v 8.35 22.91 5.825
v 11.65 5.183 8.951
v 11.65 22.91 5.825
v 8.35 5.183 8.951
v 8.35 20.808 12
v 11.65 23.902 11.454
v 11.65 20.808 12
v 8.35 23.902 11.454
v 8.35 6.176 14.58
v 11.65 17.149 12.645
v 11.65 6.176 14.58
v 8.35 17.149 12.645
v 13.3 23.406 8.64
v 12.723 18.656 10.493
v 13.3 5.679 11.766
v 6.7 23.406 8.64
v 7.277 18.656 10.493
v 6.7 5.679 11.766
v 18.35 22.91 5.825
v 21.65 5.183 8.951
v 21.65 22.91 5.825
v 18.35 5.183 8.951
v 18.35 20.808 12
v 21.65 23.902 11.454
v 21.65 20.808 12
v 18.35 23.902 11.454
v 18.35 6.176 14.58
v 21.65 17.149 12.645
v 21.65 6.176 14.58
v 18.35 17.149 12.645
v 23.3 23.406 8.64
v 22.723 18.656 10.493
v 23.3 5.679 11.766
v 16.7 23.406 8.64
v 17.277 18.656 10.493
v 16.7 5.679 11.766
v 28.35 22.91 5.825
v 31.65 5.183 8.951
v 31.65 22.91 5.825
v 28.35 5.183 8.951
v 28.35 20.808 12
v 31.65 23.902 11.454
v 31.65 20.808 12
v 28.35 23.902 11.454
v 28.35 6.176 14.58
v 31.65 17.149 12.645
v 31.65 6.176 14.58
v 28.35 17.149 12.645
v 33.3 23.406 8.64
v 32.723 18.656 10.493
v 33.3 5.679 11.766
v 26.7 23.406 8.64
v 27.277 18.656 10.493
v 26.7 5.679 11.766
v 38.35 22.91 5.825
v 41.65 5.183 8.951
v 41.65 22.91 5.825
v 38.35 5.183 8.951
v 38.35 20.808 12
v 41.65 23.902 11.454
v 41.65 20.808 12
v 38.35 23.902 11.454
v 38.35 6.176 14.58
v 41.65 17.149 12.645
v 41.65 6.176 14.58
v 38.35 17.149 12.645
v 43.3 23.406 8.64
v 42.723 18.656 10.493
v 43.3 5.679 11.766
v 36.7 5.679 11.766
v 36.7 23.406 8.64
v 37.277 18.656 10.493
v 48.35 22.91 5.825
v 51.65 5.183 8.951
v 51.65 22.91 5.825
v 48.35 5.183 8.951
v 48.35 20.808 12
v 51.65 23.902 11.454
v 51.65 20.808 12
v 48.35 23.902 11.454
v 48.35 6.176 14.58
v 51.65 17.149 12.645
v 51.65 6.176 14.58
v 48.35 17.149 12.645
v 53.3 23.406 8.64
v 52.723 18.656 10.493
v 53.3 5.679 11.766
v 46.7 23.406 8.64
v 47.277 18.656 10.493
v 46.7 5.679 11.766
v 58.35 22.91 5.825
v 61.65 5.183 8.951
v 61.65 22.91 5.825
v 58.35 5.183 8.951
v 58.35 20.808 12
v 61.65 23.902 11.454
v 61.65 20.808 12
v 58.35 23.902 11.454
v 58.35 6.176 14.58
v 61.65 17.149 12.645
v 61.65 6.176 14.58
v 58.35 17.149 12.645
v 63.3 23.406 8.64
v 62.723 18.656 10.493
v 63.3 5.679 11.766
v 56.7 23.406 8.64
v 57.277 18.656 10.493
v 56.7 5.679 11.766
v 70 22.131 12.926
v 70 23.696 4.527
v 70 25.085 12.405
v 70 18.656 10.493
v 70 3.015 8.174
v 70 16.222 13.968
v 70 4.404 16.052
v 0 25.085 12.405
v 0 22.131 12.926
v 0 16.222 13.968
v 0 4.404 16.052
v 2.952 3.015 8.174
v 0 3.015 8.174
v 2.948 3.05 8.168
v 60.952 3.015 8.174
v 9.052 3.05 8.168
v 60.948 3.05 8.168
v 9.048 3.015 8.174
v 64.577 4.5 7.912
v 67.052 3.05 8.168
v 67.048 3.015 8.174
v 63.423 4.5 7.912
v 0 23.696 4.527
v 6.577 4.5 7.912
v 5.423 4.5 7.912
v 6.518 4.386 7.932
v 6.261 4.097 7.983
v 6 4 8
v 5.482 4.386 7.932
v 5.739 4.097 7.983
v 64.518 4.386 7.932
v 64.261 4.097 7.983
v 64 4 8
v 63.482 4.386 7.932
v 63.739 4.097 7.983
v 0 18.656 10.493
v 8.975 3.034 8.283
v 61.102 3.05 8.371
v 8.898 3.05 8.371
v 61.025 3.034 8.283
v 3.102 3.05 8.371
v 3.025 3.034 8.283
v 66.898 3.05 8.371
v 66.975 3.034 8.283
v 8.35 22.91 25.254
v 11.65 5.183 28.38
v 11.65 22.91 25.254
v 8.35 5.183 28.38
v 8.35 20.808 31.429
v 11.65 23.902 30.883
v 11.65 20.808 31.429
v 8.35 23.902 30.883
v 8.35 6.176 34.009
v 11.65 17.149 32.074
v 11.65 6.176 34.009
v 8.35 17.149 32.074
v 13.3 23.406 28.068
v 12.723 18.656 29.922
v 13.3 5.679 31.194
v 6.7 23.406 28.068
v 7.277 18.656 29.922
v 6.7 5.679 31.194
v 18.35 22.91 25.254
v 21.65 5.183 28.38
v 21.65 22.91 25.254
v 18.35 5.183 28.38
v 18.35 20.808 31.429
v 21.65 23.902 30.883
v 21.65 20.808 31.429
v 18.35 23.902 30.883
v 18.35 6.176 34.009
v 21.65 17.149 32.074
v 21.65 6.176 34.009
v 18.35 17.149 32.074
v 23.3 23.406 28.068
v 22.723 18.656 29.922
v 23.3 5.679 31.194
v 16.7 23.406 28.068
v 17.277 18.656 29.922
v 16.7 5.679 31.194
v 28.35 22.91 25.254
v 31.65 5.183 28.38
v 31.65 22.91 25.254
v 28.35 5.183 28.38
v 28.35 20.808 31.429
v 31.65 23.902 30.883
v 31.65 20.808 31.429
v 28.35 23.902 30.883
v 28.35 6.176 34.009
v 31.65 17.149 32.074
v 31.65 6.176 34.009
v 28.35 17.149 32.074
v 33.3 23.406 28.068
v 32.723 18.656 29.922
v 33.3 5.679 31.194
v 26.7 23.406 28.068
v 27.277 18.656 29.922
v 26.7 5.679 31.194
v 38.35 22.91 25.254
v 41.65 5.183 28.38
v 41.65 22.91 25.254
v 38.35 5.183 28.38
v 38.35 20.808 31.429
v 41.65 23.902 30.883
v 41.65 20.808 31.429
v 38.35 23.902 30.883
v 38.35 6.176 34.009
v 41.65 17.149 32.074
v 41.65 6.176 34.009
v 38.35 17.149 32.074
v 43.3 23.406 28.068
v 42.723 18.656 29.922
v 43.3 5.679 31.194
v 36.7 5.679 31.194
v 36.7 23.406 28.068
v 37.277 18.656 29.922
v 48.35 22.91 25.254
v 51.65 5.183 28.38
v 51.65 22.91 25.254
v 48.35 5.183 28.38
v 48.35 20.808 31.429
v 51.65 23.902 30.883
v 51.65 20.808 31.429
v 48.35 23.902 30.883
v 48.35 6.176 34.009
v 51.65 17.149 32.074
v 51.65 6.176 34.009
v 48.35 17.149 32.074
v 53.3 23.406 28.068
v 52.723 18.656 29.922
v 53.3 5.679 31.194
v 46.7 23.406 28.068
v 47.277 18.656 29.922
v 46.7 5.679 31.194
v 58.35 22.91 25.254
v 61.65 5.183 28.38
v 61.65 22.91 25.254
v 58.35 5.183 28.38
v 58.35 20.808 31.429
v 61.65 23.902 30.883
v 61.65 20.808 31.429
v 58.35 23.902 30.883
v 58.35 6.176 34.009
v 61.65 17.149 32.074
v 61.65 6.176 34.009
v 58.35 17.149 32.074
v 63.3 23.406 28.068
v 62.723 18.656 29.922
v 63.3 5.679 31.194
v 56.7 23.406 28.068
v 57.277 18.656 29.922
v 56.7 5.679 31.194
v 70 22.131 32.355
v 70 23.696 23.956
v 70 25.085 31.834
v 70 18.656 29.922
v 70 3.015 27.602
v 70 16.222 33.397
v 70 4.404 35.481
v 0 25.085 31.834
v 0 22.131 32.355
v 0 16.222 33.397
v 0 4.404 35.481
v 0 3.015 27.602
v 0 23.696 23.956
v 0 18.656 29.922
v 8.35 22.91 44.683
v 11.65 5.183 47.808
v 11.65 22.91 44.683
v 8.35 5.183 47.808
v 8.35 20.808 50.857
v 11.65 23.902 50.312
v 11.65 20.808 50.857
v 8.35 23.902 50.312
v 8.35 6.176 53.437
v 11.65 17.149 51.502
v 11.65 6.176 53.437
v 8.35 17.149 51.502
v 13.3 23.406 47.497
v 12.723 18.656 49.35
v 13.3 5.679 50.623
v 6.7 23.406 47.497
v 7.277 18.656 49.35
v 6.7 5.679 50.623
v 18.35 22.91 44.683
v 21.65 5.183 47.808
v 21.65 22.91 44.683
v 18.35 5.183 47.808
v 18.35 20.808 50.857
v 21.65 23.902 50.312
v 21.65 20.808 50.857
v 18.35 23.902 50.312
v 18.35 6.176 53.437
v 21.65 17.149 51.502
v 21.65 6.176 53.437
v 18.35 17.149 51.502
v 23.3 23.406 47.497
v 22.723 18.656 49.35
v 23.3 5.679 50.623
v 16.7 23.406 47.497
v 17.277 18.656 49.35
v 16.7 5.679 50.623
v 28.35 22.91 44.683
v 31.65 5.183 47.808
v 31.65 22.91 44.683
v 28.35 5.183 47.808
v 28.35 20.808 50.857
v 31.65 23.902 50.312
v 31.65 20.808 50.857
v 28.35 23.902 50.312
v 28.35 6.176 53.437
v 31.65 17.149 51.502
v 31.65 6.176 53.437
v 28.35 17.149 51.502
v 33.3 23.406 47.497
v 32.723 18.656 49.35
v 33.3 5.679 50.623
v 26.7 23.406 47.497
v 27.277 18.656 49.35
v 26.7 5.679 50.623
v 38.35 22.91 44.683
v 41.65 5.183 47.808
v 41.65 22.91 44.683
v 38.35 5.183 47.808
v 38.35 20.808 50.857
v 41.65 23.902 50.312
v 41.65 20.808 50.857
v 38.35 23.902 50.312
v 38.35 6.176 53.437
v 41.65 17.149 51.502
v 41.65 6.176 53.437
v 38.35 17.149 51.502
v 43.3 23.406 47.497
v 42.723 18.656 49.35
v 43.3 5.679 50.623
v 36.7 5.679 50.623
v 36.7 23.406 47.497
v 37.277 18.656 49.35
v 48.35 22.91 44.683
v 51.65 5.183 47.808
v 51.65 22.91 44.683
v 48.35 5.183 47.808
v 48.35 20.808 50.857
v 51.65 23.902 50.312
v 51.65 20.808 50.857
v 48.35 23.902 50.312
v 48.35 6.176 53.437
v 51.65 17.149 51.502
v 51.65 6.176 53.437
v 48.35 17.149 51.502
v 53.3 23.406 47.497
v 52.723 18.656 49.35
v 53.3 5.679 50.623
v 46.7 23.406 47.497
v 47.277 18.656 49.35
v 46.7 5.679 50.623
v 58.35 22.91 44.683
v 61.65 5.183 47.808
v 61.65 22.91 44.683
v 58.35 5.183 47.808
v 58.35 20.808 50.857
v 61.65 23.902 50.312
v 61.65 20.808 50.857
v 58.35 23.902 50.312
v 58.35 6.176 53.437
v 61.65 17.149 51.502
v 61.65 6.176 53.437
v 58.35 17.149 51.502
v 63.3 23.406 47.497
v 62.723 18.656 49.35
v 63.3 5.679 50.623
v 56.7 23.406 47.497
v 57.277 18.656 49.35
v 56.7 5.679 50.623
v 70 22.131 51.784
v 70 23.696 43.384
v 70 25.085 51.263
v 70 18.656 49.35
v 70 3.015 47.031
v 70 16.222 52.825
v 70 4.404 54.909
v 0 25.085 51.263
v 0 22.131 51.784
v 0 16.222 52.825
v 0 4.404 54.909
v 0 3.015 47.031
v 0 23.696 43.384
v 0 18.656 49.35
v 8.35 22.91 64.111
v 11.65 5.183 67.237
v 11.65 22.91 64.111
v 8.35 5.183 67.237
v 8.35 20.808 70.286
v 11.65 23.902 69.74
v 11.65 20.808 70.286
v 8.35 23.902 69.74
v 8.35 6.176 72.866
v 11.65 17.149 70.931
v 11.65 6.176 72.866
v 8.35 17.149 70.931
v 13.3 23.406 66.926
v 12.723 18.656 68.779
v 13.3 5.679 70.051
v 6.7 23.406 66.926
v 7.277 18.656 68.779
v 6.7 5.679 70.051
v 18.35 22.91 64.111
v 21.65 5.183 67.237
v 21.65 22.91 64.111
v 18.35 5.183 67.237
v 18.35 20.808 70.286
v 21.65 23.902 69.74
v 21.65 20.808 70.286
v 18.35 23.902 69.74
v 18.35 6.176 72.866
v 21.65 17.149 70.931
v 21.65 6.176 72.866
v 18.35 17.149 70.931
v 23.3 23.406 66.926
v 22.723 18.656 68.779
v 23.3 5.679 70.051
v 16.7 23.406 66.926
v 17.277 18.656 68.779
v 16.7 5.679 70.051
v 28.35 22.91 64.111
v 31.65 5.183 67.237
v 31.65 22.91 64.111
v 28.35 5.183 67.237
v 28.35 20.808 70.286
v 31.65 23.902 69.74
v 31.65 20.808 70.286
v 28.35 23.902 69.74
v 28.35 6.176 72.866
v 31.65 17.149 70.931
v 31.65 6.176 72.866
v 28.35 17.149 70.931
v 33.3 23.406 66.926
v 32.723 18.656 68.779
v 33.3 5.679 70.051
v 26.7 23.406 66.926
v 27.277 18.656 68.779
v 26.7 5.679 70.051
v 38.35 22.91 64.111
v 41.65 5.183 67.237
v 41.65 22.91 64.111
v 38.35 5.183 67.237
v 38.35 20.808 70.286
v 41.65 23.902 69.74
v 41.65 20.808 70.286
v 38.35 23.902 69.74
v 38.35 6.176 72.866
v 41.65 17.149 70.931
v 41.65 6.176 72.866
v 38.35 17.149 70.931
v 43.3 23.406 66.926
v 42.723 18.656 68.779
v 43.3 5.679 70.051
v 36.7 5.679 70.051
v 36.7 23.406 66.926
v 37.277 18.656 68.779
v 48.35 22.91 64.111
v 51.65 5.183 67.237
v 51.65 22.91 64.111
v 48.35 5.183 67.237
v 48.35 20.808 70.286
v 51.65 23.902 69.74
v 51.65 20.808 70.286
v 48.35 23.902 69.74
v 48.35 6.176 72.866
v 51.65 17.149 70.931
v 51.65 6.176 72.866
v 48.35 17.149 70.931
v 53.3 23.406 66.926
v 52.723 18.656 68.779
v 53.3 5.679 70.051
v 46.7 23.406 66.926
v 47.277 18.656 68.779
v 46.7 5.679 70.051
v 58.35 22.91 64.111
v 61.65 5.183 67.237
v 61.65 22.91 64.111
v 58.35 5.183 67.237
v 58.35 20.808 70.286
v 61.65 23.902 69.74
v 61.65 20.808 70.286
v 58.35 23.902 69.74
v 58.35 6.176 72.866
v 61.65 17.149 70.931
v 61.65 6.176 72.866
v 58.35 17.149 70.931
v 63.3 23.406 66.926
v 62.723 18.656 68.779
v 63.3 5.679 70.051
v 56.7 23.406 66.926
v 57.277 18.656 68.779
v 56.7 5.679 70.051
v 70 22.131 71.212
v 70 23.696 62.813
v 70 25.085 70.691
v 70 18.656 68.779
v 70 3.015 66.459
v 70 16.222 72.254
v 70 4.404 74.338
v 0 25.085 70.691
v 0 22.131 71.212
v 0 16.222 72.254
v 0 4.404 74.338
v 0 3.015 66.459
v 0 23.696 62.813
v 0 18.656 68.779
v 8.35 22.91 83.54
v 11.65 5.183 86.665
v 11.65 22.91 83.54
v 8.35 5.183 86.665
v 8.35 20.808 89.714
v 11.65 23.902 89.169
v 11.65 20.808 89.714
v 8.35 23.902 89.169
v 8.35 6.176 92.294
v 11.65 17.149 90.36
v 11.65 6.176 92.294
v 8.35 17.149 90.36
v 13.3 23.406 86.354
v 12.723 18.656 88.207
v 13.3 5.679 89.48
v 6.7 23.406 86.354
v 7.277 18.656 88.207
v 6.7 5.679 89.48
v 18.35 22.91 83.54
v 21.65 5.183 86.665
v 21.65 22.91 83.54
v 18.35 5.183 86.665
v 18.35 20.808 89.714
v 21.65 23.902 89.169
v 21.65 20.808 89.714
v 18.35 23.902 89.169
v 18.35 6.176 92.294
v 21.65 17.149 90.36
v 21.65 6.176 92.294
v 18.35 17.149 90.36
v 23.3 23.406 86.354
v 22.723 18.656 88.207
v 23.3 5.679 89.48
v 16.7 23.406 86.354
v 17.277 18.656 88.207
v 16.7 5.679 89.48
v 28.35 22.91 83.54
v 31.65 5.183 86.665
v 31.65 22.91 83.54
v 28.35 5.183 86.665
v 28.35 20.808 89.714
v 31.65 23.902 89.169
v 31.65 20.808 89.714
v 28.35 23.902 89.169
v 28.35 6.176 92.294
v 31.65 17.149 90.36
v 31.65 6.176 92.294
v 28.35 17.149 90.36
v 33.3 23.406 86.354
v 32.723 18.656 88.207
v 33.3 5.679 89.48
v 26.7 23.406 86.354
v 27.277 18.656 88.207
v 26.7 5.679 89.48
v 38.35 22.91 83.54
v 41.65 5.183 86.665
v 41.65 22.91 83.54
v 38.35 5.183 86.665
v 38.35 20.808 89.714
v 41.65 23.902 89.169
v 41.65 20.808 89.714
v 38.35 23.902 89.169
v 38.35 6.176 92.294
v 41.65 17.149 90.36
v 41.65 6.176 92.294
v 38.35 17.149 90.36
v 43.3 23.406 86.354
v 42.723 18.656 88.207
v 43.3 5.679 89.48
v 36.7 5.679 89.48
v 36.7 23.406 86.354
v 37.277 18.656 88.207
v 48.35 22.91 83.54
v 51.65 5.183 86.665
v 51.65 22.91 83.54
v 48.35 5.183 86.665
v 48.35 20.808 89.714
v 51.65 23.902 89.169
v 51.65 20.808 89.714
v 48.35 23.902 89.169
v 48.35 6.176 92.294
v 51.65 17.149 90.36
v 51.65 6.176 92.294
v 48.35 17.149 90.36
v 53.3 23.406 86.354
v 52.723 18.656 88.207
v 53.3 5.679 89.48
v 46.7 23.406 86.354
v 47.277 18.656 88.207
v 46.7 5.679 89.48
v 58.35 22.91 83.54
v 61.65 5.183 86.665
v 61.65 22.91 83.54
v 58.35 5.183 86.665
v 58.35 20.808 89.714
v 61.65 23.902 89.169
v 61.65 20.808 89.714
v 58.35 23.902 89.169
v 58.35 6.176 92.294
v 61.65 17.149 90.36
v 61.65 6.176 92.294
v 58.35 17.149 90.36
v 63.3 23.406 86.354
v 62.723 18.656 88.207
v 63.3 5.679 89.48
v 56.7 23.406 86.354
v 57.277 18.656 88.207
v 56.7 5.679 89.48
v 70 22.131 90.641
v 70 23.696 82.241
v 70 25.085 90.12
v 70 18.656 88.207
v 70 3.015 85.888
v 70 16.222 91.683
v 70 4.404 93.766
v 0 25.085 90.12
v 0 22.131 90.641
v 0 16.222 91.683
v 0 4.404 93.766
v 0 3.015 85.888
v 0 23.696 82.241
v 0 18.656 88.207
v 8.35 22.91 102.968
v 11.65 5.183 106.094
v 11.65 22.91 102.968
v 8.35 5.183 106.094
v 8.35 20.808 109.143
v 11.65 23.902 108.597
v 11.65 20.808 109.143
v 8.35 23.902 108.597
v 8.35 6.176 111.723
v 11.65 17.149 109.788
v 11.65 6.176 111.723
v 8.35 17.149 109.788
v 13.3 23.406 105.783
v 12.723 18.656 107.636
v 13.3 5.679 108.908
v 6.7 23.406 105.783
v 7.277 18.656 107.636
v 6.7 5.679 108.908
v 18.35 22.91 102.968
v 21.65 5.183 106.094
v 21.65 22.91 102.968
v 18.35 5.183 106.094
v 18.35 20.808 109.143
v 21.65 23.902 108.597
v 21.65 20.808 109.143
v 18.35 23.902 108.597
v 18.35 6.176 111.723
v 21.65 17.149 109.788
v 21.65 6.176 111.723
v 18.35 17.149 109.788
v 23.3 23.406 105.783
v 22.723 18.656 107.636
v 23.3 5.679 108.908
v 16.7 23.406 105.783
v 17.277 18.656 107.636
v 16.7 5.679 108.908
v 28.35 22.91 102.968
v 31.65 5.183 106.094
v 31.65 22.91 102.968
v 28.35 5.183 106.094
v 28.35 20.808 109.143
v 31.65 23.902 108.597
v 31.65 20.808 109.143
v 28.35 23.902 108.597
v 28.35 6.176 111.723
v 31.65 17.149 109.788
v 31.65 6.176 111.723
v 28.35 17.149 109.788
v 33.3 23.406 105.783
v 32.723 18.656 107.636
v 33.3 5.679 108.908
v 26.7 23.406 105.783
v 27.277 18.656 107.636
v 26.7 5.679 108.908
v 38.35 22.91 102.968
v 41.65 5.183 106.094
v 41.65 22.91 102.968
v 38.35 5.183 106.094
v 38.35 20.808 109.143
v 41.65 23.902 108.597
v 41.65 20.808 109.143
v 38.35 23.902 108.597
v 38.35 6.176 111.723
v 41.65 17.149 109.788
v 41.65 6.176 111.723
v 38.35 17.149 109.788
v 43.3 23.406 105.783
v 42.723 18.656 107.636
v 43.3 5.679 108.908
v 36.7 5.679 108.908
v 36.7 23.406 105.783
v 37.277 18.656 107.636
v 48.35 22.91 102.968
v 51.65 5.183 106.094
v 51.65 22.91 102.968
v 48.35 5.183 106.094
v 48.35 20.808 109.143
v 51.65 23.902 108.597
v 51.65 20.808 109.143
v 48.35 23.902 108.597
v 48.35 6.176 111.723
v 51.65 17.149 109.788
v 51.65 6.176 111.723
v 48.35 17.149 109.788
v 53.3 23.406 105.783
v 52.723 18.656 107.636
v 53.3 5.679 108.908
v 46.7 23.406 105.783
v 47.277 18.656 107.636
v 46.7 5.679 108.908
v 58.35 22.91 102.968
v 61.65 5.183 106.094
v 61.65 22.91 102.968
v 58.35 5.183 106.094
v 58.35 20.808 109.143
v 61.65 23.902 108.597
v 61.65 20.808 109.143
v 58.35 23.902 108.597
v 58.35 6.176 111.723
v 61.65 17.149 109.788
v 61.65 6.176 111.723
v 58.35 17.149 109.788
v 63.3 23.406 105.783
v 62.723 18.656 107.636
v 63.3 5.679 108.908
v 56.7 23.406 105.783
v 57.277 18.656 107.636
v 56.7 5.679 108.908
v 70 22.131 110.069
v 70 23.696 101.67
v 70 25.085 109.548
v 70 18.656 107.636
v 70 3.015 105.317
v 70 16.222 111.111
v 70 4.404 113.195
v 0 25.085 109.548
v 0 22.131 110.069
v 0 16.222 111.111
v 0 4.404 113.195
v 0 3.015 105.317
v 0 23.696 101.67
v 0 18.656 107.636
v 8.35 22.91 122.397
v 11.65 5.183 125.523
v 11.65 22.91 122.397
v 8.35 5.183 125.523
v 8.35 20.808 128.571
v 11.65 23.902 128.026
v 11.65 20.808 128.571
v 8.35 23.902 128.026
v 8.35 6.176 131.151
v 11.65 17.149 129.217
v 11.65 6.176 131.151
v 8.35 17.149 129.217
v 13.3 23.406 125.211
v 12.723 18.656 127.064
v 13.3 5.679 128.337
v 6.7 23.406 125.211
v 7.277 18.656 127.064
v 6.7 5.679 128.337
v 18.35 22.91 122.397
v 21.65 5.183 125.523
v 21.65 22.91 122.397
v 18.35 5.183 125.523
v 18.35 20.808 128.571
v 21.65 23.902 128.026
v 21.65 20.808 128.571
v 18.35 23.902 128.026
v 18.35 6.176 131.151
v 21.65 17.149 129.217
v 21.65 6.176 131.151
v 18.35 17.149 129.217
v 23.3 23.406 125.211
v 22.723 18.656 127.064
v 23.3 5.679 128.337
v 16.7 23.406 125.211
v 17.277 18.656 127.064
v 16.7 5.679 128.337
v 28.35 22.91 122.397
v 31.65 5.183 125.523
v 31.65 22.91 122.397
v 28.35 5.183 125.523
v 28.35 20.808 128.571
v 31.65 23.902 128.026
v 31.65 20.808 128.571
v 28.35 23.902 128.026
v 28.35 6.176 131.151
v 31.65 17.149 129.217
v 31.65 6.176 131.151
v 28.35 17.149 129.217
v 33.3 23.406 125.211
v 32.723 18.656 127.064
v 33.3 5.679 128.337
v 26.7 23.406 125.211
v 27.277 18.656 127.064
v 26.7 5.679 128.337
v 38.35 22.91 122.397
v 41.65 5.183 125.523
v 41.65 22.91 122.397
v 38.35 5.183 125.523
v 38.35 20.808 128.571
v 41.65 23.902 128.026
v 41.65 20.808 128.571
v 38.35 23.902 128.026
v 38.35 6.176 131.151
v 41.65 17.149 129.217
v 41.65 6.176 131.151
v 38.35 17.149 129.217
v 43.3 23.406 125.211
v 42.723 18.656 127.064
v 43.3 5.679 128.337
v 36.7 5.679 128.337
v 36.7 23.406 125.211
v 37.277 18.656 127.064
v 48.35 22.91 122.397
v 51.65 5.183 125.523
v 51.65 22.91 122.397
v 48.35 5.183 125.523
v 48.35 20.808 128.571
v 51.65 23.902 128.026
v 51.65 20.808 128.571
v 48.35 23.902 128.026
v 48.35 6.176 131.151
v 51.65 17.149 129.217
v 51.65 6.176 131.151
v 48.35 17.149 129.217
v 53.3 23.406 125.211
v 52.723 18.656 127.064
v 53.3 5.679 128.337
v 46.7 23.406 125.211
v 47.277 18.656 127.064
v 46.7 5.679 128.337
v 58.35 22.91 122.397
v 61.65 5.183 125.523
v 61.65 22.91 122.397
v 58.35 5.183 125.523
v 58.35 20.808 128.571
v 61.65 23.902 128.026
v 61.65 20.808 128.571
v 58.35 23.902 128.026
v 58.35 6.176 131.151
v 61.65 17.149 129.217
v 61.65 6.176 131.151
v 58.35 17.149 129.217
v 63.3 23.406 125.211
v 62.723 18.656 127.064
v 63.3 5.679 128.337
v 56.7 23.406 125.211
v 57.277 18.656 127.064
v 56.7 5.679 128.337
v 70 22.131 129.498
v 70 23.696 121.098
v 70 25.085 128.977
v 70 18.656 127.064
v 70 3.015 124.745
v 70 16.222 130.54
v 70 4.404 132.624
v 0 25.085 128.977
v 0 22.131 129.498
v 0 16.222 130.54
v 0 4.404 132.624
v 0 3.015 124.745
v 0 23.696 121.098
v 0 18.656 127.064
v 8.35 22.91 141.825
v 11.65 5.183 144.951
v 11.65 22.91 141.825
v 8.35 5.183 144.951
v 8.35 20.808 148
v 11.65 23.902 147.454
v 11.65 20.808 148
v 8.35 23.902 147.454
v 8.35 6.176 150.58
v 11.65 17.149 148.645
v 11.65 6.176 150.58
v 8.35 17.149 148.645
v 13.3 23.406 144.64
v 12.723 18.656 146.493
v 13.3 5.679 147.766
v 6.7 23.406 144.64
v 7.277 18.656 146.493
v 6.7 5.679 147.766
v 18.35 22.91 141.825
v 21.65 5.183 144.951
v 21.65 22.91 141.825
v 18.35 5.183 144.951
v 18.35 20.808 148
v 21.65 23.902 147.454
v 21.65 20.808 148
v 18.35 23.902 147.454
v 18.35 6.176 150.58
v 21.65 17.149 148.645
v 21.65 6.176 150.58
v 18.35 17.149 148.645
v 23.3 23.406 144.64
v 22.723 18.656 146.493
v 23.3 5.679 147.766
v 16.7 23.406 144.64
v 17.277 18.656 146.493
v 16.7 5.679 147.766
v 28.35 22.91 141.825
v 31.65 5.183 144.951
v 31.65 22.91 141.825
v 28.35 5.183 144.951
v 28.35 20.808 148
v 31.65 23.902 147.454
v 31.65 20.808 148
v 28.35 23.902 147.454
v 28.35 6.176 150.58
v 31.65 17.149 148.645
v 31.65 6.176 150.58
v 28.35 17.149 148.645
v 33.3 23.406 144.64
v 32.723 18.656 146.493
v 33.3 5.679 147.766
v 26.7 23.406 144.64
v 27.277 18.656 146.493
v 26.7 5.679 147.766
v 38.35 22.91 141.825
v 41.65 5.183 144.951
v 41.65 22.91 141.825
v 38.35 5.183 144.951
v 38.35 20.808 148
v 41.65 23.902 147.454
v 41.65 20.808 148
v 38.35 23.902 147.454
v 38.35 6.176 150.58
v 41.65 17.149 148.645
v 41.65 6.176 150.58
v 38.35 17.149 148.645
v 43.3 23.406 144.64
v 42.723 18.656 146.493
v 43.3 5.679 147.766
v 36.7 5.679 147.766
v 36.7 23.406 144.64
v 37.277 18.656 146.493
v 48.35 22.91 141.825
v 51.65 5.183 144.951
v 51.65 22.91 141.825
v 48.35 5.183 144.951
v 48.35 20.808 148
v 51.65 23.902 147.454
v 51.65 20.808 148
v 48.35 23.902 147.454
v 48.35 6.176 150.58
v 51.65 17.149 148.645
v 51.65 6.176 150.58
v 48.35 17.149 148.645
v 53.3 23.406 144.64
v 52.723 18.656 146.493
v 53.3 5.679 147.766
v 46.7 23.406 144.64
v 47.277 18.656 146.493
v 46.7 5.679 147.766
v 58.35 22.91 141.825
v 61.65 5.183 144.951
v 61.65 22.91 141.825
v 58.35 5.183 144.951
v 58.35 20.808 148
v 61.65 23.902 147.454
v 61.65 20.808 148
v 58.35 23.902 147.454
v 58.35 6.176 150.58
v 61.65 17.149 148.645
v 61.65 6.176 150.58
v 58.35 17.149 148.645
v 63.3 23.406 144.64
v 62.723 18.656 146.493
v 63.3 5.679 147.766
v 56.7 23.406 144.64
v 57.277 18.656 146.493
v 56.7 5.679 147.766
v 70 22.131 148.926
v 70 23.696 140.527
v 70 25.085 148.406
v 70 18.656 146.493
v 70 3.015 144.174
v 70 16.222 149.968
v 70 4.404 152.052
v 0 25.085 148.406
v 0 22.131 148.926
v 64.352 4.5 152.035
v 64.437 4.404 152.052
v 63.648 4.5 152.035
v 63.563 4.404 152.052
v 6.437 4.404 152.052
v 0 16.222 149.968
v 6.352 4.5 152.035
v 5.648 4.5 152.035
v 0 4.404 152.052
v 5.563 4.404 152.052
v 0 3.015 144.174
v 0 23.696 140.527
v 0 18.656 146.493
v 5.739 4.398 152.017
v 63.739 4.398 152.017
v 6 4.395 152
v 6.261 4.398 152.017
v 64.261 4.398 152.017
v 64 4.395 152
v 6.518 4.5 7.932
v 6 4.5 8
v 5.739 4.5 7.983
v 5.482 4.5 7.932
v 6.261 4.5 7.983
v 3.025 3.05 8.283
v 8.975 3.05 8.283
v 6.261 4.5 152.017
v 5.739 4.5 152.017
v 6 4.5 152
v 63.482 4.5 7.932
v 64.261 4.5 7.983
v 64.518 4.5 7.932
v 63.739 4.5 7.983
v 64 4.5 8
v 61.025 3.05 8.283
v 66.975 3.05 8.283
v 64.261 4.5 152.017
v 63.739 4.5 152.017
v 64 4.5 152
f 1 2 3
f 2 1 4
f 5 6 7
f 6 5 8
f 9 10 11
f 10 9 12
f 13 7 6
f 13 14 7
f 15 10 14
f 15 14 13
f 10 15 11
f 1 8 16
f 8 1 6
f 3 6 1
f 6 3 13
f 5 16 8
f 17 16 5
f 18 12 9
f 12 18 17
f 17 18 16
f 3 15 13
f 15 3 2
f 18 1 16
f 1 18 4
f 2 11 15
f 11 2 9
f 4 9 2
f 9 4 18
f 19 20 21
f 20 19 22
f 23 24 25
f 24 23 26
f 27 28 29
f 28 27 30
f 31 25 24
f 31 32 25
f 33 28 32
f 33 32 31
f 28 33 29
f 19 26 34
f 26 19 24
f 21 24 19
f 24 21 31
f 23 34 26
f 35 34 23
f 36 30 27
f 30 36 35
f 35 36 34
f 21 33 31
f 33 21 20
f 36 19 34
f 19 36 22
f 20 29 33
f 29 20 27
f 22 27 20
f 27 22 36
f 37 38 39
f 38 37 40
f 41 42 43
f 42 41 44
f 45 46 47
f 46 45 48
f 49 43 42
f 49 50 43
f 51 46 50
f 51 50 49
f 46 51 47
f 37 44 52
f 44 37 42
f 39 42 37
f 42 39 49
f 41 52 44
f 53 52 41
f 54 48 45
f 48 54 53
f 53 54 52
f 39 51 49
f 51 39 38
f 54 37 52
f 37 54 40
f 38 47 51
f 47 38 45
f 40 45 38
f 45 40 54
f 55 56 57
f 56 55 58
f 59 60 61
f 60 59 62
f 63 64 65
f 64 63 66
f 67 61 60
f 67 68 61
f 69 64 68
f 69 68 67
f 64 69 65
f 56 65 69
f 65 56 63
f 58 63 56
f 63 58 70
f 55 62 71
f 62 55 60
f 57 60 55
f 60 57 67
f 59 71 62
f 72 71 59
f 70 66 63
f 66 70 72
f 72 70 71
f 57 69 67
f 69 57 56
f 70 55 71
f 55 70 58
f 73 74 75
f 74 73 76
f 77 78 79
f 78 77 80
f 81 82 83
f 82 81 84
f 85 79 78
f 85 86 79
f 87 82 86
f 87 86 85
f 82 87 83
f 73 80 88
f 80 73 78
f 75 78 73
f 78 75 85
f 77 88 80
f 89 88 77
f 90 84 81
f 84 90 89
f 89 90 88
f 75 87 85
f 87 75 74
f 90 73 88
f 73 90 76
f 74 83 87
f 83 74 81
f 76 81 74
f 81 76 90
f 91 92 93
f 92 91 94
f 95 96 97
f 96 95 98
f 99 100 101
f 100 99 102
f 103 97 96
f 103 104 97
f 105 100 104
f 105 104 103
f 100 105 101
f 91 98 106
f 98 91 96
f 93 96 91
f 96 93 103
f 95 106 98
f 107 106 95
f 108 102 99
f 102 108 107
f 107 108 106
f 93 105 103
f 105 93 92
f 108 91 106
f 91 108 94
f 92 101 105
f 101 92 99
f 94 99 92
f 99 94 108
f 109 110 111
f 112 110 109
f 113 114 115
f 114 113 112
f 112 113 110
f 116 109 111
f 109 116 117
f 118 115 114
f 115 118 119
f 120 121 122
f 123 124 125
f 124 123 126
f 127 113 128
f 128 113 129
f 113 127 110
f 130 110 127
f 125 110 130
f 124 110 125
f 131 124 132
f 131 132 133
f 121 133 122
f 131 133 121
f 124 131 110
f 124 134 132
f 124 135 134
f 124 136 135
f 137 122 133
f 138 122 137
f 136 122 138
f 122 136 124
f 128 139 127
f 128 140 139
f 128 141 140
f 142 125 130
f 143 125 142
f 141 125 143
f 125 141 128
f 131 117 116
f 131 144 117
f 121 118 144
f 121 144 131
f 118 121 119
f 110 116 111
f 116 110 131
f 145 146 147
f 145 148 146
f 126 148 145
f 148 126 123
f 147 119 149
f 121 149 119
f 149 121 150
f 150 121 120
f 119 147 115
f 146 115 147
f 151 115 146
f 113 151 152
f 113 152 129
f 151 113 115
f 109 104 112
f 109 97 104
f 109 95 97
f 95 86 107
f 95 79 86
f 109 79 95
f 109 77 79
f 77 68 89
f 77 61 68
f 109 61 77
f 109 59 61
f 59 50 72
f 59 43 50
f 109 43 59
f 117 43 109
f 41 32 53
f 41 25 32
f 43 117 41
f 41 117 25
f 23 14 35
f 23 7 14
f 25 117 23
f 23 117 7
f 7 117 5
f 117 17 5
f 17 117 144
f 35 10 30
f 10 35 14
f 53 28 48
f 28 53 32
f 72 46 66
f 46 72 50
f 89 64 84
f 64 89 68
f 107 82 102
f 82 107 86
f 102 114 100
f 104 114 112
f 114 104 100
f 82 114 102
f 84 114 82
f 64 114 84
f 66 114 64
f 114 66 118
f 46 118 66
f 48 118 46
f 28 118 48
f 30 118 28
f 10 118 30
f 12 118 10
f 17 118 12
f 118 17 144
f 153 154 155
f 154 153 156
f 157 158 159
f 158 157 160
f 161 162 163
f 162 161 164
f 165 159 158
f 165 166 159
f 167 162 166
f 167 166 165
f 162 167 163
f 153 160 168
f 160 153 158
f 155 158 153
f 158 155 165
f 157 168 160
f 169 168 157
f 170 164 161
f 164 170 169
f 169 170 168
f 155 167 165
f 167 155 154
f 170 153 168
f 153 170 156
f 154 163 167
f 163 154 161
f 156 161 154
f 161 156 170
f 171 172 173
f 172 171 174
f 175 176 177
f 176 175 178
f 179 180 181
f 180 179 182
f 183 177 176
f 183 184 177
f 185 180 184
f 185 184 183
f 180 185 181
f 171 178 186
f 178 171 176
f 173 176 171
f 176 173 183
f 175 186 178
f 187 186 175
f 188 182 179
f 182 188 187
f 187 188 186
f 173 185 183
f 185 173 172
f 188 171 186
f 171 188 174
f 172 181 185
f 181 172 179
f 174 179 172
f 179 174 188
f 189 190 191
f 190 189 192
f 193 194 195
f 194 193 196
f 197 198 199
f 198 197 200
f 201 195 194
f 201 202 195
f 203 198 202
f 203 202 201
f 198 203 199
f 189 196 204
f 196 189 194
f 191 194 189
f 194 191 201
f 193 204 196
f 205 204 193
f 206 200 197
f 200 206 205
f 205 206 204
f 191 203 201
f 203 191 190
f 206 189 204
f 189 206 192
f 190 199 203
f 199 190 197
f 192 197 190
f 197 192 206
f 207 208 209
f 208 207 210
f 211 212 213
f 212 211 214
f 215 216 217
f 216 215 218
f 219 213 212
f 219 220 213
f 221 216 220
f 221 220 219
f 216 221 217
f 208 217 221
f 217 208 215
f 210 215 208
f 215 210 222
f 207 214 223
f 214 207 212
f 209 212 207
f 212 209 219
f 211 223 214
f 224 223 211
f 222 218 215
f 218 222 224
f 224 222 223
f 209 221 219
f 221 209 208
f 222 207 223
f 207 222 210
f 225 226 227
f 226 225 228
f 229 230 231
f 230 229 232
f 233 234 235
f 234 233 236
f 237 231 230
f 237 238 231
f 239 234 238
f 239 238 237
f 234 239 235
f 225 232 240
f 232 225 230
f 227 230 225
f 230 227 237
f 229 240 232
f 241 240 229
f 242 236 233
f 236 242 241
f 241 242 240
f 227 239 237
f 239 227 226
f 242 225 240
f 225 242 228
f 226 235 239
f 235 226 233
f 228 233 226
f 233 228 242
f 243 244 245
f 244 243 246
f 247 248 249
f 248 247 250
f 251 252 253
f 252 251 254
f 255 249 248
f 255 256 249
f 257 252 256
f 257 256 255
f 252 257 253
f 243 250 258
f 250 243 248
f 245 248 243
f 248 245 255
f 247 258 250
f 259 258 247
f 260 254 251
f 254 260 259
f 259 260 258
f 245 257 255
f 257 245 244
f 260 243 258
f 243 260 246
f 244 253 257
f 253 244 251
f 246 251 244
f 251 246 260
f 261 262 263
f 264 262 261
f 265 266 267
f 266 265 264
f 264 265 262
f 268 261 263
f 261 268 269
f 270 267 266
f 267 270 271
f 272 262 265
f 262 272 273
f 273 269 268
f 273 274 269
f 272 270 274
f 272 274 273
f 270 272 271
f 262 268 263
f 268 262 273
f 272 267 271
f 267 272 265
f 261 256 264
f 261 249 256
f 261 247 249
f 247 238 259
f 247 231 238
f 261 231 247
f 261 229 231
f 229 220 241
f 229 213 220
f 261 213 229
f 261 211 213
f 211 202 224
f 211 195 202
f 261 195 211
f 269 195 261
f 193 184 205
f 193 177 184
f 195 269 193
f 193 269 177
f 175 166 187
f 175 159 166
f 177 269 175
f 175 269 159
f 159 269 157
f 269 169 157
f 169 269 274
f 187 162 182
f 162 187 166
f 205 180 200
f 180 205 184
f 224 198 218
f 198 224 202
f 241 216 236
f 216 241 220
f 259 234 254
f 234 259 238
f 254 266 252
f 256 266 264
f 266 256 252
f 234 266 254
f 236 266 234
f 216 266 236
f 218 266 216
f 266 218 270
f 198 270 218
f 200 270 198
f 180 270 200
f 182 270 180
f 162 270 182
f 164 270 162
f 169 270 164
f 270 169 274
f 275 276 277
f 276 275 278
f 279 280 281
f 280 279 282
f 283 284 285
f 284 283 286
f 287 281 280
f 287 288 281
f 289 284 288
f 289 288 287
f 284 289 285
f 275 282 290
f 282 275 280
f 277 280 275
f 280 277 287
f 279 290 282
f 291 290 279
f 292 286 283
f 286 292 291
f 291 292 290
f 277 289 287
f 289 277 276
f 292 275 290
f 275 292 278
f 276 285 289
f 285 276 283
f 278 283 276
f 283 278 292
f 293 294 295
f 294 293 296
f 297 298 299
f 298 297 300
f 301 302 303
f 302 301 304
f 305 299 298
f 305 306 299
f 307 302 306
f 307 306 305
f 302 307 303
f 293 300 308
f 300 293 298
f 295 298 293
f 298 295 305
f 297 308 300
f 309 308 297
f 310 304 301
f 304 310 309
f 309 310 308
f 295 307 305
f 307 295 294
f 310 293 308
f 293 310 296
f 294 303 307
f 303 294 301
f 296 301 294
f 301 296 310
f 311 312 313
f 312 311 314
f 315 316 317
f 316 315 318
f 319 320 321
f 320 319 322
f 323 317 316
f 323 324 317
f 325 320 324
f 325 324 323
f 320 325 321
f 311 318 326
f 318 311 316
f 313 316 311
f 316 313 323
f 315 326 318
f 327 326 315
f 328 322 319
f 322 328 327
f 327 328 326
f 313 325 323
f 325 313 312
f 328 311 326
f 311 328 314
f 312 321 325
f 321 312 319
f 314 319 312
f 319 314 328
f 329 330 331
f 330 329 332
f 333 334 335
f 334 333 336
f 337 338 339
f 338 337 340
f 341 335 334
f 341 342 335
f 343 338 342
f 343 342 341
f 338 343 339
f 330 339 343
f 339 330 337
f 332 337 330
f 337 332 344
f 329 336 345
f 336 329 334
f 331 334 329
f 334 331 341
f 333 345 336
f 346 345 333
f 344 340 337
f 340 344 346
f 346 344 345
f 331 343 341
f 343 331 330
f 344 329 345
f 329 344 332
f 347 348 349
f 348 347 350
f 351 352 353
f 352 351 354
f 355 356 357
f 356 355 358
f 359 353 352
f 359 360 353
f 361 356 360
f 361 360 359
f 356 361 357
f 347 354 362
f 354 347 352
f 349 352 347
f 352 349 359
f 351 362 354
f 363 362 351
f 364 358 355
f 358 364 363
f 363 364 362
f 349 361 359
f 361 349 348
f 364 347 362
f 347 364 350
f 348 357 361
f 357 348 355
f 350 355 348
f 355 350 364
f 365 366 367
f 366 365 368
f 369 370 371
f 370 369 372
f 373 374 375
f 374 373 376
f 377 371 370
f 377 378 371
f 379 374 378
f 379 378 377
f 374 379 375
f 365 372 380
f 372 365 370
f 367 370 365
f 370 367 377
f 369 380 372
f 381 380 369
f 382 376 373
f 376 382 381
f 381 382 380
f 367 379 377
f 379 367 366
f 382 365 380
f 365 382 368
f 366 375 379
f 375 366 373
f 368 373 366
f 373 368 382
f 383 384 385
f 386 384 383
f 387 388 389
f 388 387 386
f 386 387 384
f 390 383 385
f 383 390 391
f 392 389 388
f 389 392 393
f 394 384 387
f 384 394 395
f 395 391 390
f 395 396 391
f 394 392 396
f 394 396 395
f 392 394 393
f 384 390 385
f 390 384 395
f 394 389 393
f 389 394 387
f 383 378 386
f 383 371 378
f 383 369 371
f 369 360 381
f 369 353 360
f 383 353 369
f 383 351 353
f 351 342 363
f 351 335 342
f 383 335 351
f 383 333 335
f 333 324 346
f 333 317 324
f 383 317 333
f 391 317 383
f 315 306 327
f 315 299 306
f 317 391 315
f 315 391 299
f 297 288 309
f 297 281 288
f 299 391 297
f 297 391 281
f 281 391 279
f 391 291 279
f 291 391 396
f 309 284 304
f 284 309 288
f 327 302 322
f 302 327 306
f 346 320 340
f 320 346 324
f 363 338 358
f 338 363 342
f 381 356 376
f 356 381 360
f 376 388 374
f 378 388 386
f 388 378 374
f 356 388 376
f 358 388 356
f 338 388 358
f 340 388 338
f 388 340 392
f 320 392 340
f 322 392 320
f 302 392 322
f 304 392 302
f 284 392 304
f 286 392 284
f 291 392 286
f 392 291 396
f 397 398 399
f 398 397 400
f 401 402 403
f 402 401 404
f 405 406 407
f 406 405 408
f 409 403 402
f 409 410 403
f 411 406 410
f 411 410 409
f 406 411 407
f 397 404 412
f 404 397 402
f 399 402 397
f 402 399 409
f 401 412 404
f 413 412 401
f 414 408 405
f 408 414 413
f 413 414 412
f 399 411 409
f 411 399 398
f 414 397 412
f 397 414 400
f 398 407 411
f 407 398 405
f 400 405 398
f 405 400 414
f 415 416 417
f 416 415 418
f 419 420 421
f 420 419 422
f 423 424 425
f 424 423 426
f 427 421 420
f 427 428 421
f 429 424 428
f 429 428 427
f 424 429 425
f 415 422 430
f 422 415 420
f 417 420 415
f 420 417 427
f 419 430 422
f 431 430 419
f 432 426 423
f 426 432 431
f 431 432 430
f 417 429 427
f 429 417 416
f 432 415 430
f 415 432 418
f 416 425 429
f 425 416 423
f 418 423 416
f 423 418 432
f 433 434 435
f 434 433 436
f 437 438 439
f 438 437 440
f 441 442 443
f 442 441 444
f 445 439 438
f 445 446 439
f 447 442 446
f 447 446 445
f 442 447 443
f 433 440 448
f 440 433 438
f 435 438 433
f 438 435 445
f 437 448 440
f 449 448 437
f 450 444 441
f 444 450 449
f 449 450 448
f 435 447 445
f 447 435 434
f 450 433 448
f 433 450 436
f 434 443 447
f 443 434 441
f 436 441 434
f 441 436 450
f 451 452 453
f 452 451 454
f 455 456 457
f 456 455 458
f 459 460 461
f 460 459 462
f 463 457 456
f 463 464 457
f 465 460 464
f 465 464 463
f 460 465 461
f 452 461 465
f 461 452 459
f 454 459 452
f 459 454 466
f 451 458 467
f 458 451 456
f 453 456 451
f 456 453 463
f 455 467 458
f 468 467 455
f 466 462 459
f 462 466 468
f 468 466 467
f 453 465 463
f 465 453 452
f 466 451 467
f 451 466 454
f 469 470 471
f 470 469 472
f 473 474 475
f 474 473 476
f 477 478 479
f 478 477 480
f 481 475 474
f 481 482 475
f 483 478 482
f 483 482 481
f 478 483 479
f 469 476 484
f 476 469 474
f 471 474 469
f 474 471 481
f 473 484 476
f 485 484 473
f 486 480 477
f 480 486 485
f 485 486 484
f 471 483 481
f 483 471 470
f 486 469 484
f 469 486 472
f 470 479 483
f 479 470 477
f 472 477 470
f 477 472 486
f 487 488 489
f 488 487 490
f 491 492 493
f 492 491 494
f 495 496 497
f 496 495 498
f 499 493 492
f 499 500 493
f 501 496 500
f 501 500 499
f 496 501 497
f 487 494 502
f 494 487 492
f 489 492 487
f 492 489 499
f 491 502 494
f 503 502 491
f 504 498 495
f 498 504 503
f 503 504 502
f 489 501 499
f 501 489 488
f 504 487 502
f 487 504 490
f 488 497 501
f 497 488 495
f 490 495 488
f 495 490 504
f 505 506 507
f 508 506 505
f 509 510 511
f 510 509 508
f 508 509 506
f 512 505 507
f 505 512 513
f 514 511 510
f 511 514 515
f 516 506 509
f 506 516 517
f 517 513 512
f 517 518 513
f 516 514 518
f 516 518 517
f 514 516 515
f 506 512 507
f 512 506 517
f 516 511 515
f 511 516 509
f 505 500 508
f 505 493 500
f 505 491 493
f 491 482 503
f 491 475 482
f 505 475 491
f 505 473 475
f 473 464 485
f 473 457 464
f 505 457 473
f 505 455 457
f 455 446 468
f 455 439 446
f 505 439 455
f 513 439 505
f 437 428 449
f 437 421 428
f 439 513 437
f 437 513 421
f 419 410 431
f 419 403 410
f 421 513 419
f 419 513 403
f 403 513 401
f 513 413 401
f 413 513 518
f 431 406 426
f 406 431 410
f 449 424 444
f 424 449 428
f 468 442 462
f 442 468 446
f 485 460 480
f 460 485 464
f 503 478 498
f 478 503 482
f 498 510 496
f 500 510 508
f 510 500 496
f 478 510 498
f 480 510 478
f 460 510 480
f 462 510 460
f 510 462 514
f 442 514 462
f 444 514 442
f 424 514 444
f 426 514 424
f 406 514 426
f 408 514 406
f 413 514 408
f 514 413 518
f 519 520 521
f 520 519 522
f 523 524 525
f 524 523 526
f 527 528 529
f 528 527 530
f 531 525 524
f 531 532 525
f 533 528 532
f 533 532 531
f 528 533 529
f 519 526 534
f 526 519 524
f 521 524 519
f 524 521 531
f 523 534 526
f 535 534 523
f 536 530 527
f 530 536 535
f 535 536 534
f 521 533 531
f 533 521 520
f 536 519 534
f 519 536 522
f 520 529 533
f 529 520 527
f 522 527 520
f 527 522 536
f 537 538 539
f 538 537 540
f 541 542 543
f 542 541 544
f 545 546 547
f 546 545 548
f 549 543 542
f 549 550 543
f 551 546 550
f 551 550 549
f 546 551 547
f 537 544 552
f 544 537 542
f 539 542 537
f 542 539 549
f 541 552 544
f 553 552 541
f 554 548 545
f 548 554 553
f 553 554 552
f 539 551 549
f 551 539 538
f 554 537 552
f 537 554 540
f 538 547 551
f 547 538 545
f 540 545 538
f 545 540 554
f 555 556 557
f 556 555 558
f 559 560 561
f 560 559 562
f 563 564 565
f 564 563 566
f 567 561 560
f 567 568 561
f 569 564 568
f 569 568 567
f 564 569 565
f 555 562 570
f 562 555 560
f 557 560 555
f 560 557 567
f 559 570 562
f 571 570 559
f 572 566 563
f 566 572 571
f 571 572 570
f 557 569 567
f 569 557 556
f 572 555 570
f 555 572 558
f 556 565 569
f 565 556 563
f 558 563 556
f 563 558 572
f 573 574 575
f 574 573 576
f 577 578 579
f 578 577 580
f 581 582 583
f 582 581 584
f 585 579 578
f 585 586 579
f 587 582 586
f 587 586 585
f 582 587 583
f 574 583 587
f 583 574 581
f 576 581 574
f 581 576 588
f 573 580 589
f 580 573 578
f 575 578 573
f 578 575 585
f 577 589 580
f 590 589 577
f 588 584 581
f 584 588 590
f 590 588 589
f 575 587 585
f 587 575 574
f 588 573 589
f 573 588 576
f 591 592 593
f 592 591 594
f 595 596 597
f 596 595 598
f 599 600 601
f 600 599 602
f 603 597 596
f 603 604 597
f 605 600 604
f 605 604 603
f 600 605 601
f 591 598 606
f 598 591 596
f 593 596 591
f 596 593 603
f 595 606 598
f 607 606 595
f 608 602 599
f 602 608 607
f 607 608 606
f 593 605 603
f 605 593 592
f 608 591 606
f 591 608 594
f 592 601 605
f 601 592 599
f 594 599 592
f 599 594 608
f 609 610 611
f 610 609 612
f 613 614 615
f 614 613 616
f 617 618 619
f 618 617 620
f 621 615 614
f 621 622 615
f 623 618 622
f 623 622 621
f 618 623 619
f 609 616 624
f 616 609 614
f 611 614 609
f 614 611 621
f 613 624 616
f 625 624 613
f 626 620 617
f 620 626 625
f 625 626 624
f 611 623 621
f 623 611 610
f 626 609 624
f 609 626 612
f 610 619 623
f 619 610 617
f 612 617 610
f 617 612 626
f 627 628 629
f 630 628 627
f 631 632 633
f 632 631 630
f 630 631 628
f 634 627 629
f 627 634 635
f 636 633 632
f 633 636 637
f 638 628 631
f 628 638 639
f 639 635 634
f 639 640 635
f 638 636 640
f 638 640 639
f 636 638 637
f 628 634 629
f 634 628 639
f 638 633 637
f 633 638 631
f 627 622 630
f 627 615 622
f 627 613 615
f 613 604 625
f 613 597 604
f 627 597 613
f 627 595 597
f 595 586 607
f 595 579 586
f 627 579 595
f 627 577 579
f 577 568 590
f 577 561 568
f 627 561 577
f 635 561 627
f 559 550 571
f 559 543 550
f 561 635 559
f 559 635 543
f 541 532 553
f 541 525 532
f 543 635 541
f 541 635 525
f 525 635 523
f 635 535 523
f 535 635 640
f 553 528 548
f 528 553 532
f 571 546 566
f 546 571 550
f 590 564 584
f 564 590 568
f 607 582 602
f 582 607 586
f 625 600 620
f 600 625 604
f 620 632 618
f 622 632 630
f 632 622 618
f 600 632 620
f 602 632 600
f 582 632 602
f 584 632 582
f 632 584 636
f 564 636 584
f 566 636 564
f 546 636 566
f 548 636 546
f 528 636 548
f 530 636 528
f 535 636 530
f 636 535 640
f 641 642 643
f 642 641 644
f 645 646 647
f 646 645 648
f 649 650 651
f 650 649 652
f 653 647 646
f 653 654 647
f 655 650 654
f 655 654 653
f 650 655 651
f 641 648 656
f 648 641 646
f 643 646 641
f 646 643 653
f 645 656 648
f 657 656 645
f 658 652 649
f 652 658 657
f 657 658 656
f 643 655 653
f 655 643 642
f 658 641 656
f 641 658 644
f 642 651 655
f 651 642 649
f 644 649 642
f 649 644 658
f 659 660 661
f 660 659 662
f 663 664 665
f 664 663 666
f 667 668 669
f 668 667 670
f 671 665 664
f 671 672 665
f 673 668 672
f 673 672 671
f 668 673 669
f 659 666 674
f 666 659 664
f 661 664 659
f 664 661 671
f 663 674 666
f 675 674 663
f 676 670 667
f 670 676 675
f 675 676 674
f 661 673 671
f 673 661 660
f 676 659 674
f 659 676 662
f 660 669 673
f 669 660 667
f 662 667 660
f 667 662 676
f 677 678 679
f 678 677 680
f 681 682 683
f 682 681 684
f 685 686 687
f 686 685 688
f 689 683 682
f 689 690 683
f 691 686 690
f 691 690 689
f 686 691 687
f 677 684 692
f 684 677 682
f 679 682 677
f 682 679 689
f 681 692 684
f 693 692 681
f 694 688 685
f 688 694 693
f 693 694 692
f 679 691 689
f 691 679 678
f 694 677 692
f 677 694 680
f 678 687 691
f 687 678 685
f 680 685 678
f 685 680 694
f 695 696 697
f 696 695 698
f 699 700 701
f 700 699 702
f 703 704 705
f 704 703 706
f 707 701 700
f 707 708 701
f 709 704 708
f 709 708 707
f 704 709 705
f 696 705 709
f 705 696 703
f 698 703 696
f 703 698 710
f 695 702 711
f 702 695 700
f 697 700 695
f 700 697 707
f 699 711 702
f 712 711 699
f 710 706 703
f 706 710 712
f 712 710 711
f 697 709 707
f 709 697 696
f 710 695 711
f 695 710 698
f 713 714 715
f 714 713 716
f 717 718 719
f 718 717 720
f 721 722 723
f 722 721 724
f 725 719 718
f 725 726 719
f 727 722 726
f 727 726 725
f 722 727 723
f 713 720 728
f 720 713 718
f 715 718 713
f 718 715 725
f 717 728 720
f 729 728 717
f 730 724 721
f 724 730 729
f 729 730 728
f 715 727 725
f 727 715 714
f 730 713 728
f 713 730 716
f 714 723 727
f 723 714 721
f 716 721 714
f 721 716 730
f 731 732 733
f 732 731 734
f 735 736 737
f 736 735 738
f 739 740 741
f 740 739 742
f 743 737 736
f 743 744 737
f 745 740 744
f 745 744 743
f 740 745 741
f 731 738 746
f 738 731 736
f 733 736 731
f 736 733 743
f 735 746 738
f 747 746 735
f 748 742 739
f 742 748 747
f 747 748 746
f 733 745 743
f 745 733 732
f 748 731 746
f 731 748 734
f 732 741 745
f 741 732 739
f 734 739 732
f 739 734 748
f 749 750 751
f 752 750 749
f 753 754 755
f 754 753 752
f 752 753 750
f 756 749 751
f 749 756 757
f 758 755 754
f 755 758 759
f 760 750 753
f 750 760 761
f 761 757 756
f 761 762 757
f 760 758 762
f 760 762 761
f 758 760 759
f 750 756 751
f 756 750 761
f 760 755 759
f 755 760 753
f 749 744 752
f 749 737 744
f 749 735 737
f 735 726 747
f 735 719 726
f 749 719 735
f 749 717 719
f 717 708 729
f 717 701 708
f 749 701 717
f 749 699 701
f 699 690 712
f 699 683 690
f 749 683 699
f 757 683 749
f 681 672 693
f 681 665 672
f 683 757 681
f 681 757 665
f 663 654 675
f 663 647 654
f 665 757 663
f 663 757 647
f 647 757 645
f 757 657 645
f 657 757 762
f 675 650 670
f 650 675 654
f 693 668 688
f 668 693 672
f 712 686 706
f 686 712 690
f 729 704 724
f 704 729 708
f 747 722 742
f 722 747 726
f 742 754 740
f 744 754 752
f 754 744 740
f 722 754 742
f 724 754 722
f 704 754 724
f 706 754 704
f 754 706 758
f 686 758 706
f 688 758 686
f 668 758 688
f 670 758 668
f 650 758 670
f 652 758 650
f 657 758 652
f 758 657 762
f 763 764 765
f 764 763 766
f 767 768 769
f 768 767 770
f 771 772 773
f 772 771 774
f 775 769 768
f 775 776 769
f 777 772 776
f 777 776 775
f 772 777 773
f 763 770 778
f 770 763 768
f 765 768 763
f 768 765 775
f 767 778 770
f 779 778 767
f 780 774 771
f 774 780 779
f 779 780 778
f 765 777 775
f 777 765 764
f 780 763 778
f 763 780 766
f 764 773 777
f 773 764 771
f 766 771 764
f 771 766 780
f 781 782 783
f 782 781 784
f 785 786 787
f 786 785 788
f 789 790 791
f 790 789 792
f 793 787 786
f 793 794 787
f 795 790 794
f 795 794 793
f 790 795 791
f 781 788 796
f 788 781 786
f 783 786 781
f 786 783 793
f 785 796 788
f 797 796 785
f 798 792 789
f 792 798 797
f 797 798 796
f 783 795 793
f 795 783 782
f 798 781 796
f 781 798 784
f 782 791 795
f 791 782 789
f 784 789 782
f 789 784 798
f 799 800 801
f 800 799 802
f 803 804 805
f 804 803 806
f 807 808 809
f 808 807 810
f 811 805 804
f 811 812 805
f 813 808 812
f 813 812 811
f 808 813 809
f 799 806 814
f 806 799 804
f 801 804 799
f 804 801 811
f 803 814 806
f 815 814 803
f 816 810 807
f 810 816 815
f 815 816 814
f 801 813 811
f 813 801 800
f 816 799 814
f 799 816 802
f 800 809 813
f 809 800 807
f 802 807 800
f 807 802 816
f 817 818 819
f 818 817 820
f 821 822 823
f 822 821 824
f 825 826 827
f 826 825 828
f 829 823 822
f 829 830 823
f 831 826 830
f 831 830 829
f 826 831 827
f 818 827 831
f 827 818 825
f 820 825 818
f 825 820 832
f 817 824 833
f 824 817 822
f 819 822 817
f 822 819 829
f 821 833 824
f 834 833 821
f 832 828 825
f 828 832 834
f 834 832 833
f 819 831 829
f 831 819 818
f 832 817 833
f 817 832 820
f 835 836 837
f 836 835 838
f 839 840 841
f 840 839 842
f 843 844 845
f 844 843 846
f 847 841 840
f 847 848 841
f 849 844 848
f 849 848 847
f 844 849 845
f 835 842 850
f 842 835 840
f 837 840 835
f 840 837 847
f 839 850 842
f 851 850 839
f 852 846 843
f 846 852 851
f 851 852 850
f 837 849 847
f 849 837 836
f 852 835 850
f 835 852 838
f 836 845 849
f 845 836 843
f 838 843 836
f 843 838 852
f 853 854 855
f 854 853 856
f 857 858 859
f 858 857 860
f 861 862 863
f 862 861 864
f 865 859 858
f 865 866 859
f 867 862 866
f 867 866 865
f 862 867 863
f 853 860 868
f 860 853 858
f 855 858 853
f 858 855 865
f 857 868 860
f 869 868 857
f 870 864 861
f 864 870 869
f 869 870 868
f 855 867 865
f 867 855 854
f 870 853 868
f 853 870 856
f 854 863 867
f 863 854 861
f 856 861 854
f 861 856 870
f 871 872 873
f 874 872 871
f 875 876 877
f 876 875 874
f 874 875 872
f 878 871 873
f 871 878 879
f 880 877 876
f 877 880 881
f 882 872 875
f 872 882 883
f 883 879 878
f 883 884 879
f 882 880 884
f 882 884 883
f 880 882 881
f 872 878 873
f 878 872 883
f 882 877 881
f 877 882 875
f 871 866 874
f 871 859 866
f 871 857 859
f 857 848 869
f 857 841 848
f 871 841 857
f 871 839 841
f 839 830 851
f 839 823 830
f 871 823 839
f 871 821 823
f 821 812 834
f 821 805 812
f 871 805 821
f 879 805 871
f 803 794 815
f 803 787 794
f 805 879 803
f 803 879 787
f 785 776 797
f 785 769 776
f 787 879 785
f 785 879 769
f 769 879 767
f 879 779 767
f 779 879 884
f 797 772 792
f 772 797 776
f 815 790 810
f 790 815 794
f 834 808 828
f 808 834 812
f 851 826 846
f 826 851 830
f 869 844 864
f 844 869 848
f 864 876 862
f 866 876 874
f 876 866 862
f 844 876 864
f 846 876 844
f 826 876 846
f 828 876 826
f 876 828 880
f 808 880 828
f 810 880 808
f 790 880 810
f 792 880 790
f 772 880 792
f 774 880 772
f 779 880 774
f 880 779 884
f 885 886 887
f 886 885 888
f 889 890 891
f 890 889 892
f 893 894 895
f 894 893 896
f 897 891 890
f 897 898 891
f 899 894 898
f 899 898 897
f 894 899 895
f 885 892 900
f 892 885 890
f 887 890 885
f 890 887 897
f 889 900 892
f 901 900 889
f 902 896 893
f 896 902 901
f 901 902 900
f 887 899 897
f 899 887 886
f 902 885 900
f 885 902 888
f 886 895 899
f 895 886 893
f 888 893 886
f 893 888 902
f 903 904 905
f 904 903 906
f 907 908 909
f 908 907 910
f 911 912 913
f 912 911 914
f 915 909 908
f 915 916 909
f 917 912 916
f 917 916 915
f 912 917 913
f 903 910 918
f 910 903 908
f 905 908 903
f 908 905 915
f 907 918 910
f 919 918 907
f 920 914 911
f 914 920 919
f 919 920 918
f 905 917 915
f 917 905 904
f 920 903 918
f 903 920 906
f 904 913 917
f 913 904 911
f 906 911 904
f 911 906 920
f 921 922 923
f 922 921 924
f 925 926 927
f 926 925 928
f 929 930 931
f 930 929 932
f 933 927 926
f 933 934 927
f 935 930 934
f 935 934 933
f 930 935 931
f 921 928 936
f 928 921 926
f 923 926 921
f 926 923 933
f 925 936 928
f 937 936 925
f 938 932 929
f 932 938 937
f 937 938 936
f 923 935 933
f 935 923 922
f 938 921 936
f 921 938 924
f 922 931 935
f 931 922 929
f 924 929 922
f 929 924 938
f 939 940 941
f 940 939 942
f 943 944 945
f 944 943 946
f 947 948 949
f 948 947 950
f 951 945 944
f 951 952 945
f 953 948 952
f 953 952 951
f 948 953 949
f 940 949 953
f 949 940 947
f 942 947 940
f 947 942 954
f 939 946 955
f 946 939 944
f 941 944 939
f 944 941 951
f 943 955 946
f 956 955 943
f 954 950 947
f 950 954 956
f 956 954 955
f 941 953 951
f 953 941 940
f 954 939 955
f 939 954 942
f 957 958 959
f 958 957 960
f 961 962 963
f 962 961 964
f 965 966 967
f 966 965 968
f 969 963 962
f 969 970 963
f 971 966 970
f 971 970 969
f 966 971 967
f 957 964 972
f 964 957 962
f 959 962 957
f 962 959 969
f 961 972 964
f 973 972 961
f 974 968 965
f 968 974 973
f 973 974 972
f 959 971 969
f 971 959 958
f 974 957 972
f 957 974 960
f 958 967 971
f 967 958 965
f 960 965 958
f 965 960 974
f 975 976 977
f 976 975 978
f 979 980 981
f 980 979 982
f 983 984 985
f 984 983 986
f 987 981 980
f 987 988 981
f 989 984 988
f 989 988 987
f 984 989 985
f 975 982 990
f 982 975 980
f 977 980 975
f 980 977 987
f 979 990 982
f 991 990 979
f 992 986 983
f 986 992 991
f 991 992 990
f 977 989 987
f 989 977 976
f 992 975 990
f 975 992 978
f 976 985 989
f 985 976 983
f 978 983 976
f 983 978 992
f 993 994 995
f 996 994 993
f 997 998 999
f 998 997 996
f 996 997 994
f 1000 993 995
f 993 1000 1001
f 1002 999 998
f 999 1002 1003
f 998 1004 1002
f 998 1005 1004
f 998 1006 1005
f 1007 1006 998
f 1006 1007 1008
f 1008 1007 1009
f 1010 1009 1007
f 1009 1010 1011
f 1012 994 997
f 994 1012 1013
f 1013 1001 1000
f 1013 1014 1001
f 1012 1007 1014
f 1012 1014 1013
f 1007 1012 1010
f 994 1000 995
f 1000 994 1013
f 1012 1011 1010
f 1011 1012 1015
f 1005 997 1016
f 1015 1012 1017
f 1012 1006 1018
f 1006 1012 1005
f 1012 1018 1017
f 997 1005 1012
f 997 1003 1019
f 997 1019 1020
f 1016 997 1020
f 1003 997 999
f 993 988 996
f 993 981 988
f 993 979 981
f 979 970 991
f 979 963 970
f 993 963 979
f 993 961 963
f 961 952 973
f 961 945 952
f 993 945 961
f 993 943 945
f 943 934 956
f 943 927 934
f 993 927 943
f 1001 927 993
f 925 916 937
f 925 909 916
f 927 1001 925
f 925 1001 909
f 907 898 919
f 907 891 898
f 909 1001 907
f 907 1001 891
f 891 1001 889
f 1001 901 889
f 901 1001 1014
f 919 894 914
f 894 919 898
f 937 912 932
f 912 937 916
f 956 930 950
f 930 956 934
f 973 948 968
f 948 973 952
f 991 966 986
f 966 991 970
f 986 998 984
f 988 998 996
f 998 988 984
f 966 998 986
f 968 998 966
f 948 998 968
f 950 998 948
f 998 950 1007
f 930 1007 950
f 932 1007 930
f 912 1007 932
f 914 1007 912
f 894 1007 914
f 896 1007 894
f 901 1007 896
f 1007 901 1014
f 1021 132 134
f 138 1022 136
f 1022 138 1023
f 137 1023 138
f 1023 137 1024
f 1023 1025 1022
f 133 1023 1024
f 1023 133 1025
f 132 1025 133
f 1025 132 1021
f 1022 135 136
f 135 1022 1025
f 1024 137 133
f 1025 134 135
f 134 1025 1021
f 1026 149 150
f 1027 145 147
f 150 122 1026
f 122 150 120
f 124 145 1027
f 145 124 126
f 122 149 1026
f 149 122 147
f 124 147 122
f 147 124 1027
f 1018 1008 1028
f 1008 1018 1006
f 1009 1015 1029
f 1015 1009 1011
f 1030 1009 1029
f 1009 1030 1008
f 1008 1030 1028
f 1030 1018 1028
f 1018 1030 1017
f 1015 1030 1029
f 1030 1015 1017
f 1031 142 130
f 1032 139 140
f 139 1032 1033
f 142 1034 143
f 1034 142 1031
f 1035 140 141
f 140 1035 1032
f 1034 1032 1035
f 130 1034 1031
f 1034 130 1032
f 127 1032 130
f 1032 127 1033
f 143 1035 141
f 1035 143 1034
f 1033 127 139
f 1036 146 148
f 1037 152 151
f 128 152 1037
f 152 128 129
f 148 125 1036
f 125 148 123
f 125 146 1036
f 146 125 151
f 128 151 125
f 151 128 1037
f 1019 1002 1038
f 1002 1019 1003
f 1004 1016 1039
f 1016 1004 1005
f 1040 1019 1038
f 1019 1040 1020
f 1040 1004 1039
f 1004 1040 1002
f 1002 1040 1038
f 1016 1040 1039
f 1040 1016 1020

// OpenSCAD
// Bit organizer inspired by reference images (70mm x 160mm, 48 slots).
$fn = 48;

rows = 8;
cols = 6;

// Slot sizing for 1/4" bits with light clearance.
bitHexAcrossFlats = 6.6;
bitHexRadius = bitHexAcrossFlats / 2;
bitHoleDepth = 18;

// Layout tuned to 70mm width and 160mm height.
plateWidth = 70.0;
plateHeight = 160.0;

holeSpacingX = (plateWidth - 2 * 5.0) / cols;
rowPitch = (plateHeight - 2 * 8.0 - 8.0) / (rows - 1);

shelfDepth = 20.0;
shelfHeight = 8.0;
shelfTilt = -10; // degrees, downward
backOverlap = 1.0;

plateThickness = 4.0;
plateMarginX = 5.0;
plateMarginTop = 8.0;
plateMarginBottom = 8.0;

screwHoleDiameter = 4.0;
screwHeadCounterbore = 7.5;
screwTabHeight = 8.0;
screwHoleInsetX = 6.0;
screwHoleInsetZ = 6.0;
cornerRadius = 3.0;

module hex_hole(depth)
{
  rotate([90, 0, 0])
    cylinder(h = depth, r = bitHexRadius, $fn = 6, center = true);
}

module rounded_rect(width, height, radius)
{
  hull()
  {
    translate([radius, radius, 0]) cylinder(h = 1, r = radius);
    translate([width - radius, radius, 0]) cylinder(h = 1, r = radius);
    translate([width - radius, height - radius, 0]) cylinder(h = 1, r = radius);
    translate([radius, height - radius, 0]) cylinder(h = 1, r = radius);
  }
}

module shelf_row(rowIndex)
{
  zBase = plateMarginBottom + rowIndex * rowPitch;

  translate([0, plateThickness, zBase])
    rotate([shelfTilt, 0, 0])
      translate([0, 0, 0])
        difference()
        {
          translate([0, -backOverlap, 0])
            cube([plateWidth, shelfDepth + backOverlap, shelfHeight]);
          // Add a front chamfer for the stepped shelf look.
          translate([-1, shelfDepth - 6, shelfHeight - 3])
            rotate([45, 0, 0])
              cube([plateWidth + 2, 8, 8], center = false);

          for (colIndex = [0 : cols - 1])
          {
            xPos = plateMarginX + colIndex * holeSpacingX + holeSpacingX / 2;
            yPos = shelfDepth / 2;
            zPos = shelfHeight / 2;

            translate([xPos, yPos, zPos])
              hex_hole(bitHoleDepth);
          }
        }
}

module organizer()
{
  color(partColor)
    difference()
    {
      union()
      {
        linear_extrude(height = plateThickness)
          rounded_rect(plateWidth, plateHeight, cornerRadius);

        for (rowIndex = [0 : rows - 1])
        {
          shelf_row(rowIndex);
        }
      }

      for (xPos = [screwHoleInsetX, plateWidth - screwHoleInsetX])
      {
        for (zPos = [screwHoleInsetZ, plateHeight - screwHoleInsetZ])
        {
          translate([xPos, plateThickness / 2, zPos])
            rotate([90, 0, 0])
              cylinder(h = plateThickness + 1, d = screwHoleDiameter, center = true);
          translate([xPos, plateThickness / 2, zPos])
            rotate([90, 0, 0])
              cylinder(h = plateThickness / 2 + 0.1, d = screwHeadCounterbore, center = true);
        }
      }
    }
}

organizer();
// Color tuned to the cool light-gray plastic in the reference photos.
partColor = [0.66, 0.67, 0.68];
